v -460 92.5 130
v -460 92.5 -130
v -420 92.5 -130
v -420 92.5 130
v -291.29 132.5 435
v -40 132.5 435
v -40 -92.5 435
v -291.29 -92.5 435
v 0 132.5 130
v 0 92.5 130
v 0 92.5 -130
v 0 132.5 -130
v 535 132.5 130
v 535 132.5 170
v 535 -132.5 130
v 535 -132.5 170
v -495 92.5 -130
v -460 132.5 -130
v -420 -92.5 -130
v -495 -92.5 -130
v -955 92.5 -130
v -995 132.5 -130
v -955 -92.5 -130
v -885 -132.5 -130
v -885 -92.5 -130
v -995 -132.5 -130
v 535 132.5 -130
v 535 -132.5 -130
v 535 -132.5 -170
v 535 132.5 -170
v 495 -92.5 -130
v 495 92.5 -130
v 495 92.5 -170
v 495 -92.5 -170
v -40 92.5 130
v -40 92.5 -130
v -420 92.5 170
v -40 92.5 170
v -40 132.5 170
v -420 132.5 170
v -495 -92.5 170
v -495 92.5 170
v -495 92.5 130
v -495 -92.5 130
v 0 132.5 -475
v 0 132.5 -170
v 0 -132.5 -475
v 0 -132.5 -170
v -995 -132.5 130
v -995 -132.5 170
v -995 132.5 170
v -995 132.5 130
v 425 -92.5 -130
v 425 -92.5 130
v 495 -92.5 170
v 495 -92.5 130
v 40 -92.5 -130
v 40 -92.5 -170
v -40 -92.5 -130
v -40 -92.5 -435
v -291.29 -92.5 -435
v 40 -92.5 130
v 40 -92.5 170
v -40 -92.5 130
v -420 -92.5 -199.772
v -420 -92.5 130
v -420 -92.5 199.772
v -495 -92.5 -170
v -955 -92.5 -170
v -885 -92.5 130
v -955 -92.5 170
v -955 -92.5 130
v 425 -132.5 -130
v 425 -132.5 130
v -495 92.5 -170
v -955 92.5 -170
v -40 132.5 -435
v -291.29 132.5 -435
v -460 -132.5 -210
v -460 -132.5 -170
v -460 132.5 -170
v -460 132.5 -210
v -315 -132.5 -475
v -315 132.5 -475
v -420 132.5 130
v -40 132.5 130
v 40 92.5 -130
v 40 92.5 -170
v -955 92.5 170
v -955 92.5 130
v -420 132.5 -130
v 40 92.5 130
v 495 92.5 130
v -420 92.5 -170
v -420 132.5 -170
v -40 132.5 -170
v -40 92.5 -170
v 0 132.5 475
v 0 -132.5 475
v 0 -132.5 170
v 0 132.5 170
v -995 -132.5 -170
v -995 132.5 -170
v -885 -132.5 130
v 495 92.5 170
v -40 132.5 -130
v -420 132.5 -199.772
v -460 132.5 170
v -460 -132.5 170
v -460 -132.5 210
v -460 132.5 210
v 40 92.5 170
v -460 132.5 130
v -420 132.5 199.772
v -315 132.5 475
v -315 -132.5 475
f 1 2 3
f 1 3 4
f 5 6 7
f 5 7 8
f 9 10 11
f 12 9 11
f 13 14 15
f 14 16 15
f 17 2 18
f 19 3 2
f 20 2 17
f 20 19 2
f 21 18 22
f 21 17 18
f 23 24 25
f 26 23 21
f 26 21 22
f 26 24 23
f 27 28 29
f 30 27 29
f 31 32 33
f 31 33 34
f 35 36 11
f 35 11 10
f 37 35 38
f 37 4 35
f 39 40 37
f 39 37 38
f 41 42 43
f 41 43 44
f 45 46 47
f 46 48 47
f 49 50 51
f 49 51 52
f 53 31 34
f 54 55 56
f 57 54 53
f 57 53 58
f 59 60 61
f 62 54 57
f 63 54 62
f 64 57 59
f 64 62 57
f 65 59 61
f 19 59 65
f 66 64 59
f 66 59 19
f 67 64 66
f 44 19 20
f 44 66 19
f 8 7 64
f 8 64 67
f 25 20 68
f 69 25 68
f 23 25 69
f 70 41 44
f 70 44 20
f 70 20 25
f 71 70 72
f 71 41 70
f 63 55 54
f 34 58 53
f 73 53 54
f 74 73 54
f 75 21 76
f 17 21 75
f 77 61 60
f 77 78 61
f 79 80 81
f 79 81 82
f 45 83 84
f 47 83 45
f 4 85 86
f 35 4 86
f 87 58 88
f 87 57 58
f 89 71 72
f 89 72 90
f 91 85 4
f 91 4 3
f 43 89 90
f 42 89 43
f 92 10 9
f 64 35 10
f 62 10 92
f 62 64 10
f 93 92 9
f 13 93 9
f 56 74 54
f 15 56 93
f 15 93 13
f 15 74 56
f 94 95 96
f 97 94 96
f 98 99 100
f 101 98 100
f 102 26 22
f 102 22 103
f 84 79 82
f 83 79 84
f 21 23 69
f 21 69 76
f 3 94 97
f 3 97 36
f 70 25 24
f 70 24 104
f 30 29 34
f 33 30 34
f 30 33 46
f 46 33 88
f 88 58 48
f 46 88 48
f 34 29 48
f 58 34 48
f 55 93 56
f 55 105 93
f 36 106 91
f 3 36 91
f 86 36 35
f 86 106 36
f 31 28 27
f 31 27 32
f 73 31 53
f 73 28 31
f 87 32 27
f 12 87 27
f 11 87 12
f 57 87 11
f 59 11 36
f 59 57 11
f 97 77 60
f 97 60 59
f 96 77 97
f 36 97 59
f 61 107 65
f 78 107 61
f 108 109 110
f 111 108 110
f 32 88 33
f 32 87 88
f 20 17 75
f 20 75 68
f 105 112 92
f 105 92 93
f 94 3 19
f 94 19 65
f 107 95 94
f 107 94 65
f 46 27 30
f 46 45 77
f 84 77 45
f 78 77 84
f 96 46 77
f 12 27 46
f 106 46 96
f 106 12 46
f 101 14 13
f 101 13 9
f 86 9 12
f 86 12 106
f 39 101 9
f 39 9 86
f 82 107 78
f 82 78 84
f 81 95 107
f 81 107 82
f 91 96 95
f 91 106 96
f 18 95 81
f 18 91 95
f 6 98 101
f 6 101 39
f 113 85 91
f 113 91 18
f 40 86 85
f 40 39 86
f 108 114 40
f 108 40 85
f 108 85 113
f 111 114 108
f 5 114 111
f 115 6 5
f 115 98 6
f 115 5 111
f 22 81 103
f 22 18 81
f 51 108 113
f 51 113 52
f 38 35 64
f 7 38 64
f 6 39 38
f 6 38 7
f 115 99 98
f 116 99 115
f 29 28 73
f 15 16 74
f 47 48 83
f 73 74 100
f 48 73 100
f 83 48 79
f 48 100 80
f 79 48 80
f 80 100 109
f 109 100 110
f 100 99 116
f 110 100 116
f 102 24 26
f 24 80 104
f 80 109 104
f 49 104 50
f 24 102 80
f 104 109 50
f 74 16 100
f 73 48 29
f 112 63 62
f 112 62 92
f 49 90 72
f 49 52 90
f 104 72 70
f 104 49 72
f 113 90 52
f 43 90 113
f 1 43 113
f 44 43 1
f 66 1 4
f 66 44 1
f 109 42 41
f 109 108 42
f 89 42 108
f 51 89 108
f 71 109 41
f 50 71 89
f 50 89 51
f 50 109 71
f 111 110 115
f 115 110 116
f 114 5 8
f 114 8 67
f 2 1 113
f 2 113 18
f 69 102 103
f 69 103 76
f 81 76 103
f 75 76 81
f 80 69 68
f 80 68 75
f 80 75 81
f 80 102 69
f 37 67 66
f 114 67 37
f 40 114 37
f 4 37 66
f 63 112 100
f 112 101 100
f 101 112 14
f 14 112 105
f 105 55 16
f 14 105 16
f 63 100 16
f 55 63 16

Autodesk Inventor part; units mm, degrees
ref_plane "YZ Plane" through (0, 0, 0) normal (1, 0, 0) x (0, 1, 0)
ref_plane "XZ Plane" through (0, 0, 0) normal (0, 1, 0) x (-1, 0, 0)
sketch "스케치1" plane through (0, 0, 0) normal (0, 1, 0) x (-1, 0, 0)
  line L0 (0, 475) -> (0, -475)
  line L1 (0, 475) -> (315, 475)
  line L2 (460, 170) -> (460, -170)
  line L3 (315, -475) -> (0, -475)
  line L4 (0, 0) -> (678.9617, 0) construction
  line L5 (460, 170) -> (995, 170)
  line L6 (995, -170) -> (460, -170)
  line L7 (460, 130) -> (995, 130)
  line L8 (995, -130) -> (460, -130)
  line L9 (995, 170) -> (995, 130)
  line L10 (995, -130) -> (995, -170)
  line L11 (0, 170) -> (-535, 170)
  line L12 (-535, -170) -> (0, -170)
  line L13 (-10, 130) -> (-535, 130)
  line L14 (-535, -130) -> (-10, -130)
  line L15 (-535, 170) -> (-535, 130)
  line L16 (-535, -130) -> (-535, -170)
  line L17 (460, 170) -> (460, 210)
  line L18 (460, -170) -> (460, -210)
  line L19 (460, 210) -> (315, 475)
  line L20 (460, -210) -> (315, -475)
  line L21 (420, 170) -> (420, 199.7721)
  line L22 (420, 199.7721) -> (291.2904, 435)
  line L23 (291.2904, 435) -> (40, 435)
  line L24 (40, 435) -> (40, -435)
  line L25 (40, -435) -> (291.2904, -435)
  line L26 (291.2904, -435) -> (420, -199.7721)
  line L27 (420, -199.7721) -> (420, 170)
  line L28 (460, -170) -> (0, -170)
  line L29 (-10, -130) -> (460, -130)
  line L30 (460, 130) -> (-10, 130)
  line L31 (460, 170) -> (0, 170)
  point P0 (460, 0)
  point P1 (995, -150)
  point P2 (-535, -150)
  point P3 (0, 130)
  point P4 (0, -130)
  point P5 (460, -190)
  point P6 (0, -130)
  point P7 (0, 130)
  dimension "d1" = 315
  dimension "d2" = 950
  dimension "d3" = 340
  dimension "d4" = 535
  dimension "d5" = 40
  dimension "d6" = 40
  dimension "d7" = 535
  dimension "d8" = 40
  dimension "d9" = 40
  dimension "d10" = 340
  dimension "d11" = 130
  dimension "d12" = 460
  dimension "d13" = 535
  dimension "d14" = 40
  dimension "d15" = 40
  dimension "d16" = 315
  dimension "d17" = 535
  dimension "d32" = 40
  dimension "d42" = 40
extrude "돌출1" add sketch "스케치1" along normal mid plane 265
sketch "스케치2" plane through (-995, 132.5, 170) normal (0, 0, 1) x (1, 0, 0)
  line L0 (535, -265) -> (535, 0) projected
  line L1 (0, 0) -> (535, 0) projected
  line L2 (0, -265) -> (0, 0) projected
  line L3 (535, -265) -> (0, -265) projected
  line L4 (1530, -265) -> (1530, 0) projected
  line L5 (995, 0) -> (1530, 0) projected
  line L6 (995, -265) -> (995, 0) projected
  line L7 (1530, -265) -> (995, -265) projected
  line L8 (500, -40) -> (500, -225)
  line L9 (535, -225) -> (0, -225)
  line L10 (40, -225) -> (40, -40)
  line L11 (40, -40) -> (535, -40)
  line L12 (1490, -40) -> (1490, -225)
  line L13 (1530, -225) -> (995, -225)
  line L14 (1035, -225) -> (1035, -40)
  line L15 (995, -40) -> (1490, -40)
  point P0 (995, -132.5)
  dimension "d20" = 40
  dimension "d21" = 40
  dimension "d30" = 185
  dimension "d31" = 40
extrude "돌출2" cut sketch "스케치2" against normal blind 8000 contours L9 L10 L11 L8 | L13 L14 L15 L12
extrude "돌출3" add sketch "스케치2" against normal blind 340 contours L3 L2 L9 L0 | L7 L6 L13 L4
sketch "스케치3" plane through (-955, -92.5, 170) normal (0, 1, 0) x (1, 0, 0)
  line L0 (70, 300) -> (70, 40)
  line L1 (1490, 300) -> (1380, 300)
  line L2 (1380, 300) -> (1380, 40)
  line L3 (1490, 0) -> (1490, 40) projected
  line L4 (1380, 40) -> (1490, 40)
  line L5 (70, 40) -> (-40, 40)
  line L6 (-40, 0) -> (-40, 340) projected
  line L7 (1490, 40) -> (1490, 300) projected
  line L8 (-40, 300) -> (0, 300) projected
  line L9 (-40, 300) -> (70, 300)
  point P0 (955, 170)
  dimension "d26" = 110
  dimension "d43" = 110
sketch "스케치4" plane through (0, 132.5, 0) normal (0, 1, 0) x (1, 0, 0)
  line L0 (0, -475) -> (0, -170) projected
  line L1 (0, -170) -> (535, -170) projected
  line L2 (535, -170) -> (535, -130) projected
  line L3 (535, -130) -> (0, -130) projected
  line L4 (0, 170) -> (0, 475) projected
  line L5 (0, 475) -> (-315, 475) projected
  line L6 (-315, 475) -> (-460, 210) projected
  line L7 (-460, 210) -> (-460, 170) projected
  line L8 (-460, 170) -> (-995, 170) projected
  line L9 (-995, 170) -> (-995, 130) projected
  line L10 (-995, 130) -> (-460, 130) projected
  line L11 (-460, 130) -> (-460, -130) projected
  line L12 (-460, -130) -> (-995, -130) projected
  line L13 (-995, -130) -> (-995, -170) projected
  line L14 (-995, -170) -> (-460, -170) projected
  line L15 (-460, -170) -> (-460, -210) projected
  line L16 (-460, -210) -> (-315, -475) projected
  line L17 (-315, -475) -> (0, -475) projected
  line L18 (-291.2904, -435) -> (-420, -199.7721)
  line L19 (-420, -199.7721) -> (-420, -170)
  line L20 (-420, -170) -> (-420, 130)
  line L21 (-420, 130) -> (-420, 199.7721)
  line L22 (-420, 199.7721) -> (-291.2904, 435)
  line L23 (-291.2904, 435) -> (-40, 435)
  line L24 (-40, 435) -> (-40, 170)
  line L25 (-40, 170) -> (-40, -130)
  line L26 (-40, -130) -> (-40, -435)
  line L27 (-40, -435) -> (-291.2904, -435)
  line L28 (-460, -170) -> (0, -170)
  line L29 (-460, -130) -> (0, -130)
  line L30 (-460, 170) -> (0, 170)
  line L31 (0, -130) -> (0, 130) projected
  line L32 (0, 130) -> (535, 130) projected
  line L33 (535, 130) -> (535, 170) projected
  line L34 (535, 170) -> (0, 170) projected
  line L35 (0, 130) -> (-460, 130)
  point P0 (0, 0)
  point P1 (-420, 170)
  point P2 (-420, -130)
  point P3 (-40, -170)
  point P4 (-420, -170)
  point P5 (-165.6452, 435)
  point P6 (-40, 130)
  point P7 (-420, 130)
  dimension "d33" = 40
  dimension "d46" = 40
  dimension "d47" = 90
  dimension "d48" = 265
sketch "스케치5" plane through (-460, 132.5, -130) normal (-1, 0, 0) x (0, 0, 1)
  line L0 (0, 0) -> (260, 0) projected
  line L1 (0, -225) -> (260, -225) projected
  line L2 (0, -40) -> (260, -40)
  line L3 (0, -225) -> (0, 0) projected
  line L4 (260, -225) -> (260, 0) projected
  point P0 (130, -132.5)
  point P1 (0, -265)
  point P2 (260, -265)
  dimension "d36" = 40
extrude "돌출6" cut sketch "스케치5" against normal blind 1000 contours L2 L4 L1 L3
ref_plane "작업 평면1" through (-420, 132.5, 170) normal (0, 0, 1) x (1, 0, 0)
sketch "스케치7" plane through (-420, 132.5, 170) normal (0, 0, 1) x (1, 0, 0)
  line L0 (0, 0) -> (380, 0) projected
  line L1 (0, -40) -> (390, -40)
  line L2 (0, 0) -> (380, 0) projected
  line L3 (0, 0) -> (0, -225) projected
  line L4 (0, -225) -> (380, -225) projected
  line L5 (380, 0) -> (380, -225) projected
  point P0 (420, -132.5)
  point P1 (380, -40)
  dimension "d39" = 40
extrude "돌출7" cut sketch "스케치7" against normal blind 350 contours L1 L5 L4 L3
extrude "돌출8" cut sketch "스케치3" against normal blind 265
extrude "돌출9" cut sketch "스케치4" against normal blind 225 contours L26 L27 L18 L19 L28 | L29 L20 L35 L25 | L30 L21 L22 L23 L24
